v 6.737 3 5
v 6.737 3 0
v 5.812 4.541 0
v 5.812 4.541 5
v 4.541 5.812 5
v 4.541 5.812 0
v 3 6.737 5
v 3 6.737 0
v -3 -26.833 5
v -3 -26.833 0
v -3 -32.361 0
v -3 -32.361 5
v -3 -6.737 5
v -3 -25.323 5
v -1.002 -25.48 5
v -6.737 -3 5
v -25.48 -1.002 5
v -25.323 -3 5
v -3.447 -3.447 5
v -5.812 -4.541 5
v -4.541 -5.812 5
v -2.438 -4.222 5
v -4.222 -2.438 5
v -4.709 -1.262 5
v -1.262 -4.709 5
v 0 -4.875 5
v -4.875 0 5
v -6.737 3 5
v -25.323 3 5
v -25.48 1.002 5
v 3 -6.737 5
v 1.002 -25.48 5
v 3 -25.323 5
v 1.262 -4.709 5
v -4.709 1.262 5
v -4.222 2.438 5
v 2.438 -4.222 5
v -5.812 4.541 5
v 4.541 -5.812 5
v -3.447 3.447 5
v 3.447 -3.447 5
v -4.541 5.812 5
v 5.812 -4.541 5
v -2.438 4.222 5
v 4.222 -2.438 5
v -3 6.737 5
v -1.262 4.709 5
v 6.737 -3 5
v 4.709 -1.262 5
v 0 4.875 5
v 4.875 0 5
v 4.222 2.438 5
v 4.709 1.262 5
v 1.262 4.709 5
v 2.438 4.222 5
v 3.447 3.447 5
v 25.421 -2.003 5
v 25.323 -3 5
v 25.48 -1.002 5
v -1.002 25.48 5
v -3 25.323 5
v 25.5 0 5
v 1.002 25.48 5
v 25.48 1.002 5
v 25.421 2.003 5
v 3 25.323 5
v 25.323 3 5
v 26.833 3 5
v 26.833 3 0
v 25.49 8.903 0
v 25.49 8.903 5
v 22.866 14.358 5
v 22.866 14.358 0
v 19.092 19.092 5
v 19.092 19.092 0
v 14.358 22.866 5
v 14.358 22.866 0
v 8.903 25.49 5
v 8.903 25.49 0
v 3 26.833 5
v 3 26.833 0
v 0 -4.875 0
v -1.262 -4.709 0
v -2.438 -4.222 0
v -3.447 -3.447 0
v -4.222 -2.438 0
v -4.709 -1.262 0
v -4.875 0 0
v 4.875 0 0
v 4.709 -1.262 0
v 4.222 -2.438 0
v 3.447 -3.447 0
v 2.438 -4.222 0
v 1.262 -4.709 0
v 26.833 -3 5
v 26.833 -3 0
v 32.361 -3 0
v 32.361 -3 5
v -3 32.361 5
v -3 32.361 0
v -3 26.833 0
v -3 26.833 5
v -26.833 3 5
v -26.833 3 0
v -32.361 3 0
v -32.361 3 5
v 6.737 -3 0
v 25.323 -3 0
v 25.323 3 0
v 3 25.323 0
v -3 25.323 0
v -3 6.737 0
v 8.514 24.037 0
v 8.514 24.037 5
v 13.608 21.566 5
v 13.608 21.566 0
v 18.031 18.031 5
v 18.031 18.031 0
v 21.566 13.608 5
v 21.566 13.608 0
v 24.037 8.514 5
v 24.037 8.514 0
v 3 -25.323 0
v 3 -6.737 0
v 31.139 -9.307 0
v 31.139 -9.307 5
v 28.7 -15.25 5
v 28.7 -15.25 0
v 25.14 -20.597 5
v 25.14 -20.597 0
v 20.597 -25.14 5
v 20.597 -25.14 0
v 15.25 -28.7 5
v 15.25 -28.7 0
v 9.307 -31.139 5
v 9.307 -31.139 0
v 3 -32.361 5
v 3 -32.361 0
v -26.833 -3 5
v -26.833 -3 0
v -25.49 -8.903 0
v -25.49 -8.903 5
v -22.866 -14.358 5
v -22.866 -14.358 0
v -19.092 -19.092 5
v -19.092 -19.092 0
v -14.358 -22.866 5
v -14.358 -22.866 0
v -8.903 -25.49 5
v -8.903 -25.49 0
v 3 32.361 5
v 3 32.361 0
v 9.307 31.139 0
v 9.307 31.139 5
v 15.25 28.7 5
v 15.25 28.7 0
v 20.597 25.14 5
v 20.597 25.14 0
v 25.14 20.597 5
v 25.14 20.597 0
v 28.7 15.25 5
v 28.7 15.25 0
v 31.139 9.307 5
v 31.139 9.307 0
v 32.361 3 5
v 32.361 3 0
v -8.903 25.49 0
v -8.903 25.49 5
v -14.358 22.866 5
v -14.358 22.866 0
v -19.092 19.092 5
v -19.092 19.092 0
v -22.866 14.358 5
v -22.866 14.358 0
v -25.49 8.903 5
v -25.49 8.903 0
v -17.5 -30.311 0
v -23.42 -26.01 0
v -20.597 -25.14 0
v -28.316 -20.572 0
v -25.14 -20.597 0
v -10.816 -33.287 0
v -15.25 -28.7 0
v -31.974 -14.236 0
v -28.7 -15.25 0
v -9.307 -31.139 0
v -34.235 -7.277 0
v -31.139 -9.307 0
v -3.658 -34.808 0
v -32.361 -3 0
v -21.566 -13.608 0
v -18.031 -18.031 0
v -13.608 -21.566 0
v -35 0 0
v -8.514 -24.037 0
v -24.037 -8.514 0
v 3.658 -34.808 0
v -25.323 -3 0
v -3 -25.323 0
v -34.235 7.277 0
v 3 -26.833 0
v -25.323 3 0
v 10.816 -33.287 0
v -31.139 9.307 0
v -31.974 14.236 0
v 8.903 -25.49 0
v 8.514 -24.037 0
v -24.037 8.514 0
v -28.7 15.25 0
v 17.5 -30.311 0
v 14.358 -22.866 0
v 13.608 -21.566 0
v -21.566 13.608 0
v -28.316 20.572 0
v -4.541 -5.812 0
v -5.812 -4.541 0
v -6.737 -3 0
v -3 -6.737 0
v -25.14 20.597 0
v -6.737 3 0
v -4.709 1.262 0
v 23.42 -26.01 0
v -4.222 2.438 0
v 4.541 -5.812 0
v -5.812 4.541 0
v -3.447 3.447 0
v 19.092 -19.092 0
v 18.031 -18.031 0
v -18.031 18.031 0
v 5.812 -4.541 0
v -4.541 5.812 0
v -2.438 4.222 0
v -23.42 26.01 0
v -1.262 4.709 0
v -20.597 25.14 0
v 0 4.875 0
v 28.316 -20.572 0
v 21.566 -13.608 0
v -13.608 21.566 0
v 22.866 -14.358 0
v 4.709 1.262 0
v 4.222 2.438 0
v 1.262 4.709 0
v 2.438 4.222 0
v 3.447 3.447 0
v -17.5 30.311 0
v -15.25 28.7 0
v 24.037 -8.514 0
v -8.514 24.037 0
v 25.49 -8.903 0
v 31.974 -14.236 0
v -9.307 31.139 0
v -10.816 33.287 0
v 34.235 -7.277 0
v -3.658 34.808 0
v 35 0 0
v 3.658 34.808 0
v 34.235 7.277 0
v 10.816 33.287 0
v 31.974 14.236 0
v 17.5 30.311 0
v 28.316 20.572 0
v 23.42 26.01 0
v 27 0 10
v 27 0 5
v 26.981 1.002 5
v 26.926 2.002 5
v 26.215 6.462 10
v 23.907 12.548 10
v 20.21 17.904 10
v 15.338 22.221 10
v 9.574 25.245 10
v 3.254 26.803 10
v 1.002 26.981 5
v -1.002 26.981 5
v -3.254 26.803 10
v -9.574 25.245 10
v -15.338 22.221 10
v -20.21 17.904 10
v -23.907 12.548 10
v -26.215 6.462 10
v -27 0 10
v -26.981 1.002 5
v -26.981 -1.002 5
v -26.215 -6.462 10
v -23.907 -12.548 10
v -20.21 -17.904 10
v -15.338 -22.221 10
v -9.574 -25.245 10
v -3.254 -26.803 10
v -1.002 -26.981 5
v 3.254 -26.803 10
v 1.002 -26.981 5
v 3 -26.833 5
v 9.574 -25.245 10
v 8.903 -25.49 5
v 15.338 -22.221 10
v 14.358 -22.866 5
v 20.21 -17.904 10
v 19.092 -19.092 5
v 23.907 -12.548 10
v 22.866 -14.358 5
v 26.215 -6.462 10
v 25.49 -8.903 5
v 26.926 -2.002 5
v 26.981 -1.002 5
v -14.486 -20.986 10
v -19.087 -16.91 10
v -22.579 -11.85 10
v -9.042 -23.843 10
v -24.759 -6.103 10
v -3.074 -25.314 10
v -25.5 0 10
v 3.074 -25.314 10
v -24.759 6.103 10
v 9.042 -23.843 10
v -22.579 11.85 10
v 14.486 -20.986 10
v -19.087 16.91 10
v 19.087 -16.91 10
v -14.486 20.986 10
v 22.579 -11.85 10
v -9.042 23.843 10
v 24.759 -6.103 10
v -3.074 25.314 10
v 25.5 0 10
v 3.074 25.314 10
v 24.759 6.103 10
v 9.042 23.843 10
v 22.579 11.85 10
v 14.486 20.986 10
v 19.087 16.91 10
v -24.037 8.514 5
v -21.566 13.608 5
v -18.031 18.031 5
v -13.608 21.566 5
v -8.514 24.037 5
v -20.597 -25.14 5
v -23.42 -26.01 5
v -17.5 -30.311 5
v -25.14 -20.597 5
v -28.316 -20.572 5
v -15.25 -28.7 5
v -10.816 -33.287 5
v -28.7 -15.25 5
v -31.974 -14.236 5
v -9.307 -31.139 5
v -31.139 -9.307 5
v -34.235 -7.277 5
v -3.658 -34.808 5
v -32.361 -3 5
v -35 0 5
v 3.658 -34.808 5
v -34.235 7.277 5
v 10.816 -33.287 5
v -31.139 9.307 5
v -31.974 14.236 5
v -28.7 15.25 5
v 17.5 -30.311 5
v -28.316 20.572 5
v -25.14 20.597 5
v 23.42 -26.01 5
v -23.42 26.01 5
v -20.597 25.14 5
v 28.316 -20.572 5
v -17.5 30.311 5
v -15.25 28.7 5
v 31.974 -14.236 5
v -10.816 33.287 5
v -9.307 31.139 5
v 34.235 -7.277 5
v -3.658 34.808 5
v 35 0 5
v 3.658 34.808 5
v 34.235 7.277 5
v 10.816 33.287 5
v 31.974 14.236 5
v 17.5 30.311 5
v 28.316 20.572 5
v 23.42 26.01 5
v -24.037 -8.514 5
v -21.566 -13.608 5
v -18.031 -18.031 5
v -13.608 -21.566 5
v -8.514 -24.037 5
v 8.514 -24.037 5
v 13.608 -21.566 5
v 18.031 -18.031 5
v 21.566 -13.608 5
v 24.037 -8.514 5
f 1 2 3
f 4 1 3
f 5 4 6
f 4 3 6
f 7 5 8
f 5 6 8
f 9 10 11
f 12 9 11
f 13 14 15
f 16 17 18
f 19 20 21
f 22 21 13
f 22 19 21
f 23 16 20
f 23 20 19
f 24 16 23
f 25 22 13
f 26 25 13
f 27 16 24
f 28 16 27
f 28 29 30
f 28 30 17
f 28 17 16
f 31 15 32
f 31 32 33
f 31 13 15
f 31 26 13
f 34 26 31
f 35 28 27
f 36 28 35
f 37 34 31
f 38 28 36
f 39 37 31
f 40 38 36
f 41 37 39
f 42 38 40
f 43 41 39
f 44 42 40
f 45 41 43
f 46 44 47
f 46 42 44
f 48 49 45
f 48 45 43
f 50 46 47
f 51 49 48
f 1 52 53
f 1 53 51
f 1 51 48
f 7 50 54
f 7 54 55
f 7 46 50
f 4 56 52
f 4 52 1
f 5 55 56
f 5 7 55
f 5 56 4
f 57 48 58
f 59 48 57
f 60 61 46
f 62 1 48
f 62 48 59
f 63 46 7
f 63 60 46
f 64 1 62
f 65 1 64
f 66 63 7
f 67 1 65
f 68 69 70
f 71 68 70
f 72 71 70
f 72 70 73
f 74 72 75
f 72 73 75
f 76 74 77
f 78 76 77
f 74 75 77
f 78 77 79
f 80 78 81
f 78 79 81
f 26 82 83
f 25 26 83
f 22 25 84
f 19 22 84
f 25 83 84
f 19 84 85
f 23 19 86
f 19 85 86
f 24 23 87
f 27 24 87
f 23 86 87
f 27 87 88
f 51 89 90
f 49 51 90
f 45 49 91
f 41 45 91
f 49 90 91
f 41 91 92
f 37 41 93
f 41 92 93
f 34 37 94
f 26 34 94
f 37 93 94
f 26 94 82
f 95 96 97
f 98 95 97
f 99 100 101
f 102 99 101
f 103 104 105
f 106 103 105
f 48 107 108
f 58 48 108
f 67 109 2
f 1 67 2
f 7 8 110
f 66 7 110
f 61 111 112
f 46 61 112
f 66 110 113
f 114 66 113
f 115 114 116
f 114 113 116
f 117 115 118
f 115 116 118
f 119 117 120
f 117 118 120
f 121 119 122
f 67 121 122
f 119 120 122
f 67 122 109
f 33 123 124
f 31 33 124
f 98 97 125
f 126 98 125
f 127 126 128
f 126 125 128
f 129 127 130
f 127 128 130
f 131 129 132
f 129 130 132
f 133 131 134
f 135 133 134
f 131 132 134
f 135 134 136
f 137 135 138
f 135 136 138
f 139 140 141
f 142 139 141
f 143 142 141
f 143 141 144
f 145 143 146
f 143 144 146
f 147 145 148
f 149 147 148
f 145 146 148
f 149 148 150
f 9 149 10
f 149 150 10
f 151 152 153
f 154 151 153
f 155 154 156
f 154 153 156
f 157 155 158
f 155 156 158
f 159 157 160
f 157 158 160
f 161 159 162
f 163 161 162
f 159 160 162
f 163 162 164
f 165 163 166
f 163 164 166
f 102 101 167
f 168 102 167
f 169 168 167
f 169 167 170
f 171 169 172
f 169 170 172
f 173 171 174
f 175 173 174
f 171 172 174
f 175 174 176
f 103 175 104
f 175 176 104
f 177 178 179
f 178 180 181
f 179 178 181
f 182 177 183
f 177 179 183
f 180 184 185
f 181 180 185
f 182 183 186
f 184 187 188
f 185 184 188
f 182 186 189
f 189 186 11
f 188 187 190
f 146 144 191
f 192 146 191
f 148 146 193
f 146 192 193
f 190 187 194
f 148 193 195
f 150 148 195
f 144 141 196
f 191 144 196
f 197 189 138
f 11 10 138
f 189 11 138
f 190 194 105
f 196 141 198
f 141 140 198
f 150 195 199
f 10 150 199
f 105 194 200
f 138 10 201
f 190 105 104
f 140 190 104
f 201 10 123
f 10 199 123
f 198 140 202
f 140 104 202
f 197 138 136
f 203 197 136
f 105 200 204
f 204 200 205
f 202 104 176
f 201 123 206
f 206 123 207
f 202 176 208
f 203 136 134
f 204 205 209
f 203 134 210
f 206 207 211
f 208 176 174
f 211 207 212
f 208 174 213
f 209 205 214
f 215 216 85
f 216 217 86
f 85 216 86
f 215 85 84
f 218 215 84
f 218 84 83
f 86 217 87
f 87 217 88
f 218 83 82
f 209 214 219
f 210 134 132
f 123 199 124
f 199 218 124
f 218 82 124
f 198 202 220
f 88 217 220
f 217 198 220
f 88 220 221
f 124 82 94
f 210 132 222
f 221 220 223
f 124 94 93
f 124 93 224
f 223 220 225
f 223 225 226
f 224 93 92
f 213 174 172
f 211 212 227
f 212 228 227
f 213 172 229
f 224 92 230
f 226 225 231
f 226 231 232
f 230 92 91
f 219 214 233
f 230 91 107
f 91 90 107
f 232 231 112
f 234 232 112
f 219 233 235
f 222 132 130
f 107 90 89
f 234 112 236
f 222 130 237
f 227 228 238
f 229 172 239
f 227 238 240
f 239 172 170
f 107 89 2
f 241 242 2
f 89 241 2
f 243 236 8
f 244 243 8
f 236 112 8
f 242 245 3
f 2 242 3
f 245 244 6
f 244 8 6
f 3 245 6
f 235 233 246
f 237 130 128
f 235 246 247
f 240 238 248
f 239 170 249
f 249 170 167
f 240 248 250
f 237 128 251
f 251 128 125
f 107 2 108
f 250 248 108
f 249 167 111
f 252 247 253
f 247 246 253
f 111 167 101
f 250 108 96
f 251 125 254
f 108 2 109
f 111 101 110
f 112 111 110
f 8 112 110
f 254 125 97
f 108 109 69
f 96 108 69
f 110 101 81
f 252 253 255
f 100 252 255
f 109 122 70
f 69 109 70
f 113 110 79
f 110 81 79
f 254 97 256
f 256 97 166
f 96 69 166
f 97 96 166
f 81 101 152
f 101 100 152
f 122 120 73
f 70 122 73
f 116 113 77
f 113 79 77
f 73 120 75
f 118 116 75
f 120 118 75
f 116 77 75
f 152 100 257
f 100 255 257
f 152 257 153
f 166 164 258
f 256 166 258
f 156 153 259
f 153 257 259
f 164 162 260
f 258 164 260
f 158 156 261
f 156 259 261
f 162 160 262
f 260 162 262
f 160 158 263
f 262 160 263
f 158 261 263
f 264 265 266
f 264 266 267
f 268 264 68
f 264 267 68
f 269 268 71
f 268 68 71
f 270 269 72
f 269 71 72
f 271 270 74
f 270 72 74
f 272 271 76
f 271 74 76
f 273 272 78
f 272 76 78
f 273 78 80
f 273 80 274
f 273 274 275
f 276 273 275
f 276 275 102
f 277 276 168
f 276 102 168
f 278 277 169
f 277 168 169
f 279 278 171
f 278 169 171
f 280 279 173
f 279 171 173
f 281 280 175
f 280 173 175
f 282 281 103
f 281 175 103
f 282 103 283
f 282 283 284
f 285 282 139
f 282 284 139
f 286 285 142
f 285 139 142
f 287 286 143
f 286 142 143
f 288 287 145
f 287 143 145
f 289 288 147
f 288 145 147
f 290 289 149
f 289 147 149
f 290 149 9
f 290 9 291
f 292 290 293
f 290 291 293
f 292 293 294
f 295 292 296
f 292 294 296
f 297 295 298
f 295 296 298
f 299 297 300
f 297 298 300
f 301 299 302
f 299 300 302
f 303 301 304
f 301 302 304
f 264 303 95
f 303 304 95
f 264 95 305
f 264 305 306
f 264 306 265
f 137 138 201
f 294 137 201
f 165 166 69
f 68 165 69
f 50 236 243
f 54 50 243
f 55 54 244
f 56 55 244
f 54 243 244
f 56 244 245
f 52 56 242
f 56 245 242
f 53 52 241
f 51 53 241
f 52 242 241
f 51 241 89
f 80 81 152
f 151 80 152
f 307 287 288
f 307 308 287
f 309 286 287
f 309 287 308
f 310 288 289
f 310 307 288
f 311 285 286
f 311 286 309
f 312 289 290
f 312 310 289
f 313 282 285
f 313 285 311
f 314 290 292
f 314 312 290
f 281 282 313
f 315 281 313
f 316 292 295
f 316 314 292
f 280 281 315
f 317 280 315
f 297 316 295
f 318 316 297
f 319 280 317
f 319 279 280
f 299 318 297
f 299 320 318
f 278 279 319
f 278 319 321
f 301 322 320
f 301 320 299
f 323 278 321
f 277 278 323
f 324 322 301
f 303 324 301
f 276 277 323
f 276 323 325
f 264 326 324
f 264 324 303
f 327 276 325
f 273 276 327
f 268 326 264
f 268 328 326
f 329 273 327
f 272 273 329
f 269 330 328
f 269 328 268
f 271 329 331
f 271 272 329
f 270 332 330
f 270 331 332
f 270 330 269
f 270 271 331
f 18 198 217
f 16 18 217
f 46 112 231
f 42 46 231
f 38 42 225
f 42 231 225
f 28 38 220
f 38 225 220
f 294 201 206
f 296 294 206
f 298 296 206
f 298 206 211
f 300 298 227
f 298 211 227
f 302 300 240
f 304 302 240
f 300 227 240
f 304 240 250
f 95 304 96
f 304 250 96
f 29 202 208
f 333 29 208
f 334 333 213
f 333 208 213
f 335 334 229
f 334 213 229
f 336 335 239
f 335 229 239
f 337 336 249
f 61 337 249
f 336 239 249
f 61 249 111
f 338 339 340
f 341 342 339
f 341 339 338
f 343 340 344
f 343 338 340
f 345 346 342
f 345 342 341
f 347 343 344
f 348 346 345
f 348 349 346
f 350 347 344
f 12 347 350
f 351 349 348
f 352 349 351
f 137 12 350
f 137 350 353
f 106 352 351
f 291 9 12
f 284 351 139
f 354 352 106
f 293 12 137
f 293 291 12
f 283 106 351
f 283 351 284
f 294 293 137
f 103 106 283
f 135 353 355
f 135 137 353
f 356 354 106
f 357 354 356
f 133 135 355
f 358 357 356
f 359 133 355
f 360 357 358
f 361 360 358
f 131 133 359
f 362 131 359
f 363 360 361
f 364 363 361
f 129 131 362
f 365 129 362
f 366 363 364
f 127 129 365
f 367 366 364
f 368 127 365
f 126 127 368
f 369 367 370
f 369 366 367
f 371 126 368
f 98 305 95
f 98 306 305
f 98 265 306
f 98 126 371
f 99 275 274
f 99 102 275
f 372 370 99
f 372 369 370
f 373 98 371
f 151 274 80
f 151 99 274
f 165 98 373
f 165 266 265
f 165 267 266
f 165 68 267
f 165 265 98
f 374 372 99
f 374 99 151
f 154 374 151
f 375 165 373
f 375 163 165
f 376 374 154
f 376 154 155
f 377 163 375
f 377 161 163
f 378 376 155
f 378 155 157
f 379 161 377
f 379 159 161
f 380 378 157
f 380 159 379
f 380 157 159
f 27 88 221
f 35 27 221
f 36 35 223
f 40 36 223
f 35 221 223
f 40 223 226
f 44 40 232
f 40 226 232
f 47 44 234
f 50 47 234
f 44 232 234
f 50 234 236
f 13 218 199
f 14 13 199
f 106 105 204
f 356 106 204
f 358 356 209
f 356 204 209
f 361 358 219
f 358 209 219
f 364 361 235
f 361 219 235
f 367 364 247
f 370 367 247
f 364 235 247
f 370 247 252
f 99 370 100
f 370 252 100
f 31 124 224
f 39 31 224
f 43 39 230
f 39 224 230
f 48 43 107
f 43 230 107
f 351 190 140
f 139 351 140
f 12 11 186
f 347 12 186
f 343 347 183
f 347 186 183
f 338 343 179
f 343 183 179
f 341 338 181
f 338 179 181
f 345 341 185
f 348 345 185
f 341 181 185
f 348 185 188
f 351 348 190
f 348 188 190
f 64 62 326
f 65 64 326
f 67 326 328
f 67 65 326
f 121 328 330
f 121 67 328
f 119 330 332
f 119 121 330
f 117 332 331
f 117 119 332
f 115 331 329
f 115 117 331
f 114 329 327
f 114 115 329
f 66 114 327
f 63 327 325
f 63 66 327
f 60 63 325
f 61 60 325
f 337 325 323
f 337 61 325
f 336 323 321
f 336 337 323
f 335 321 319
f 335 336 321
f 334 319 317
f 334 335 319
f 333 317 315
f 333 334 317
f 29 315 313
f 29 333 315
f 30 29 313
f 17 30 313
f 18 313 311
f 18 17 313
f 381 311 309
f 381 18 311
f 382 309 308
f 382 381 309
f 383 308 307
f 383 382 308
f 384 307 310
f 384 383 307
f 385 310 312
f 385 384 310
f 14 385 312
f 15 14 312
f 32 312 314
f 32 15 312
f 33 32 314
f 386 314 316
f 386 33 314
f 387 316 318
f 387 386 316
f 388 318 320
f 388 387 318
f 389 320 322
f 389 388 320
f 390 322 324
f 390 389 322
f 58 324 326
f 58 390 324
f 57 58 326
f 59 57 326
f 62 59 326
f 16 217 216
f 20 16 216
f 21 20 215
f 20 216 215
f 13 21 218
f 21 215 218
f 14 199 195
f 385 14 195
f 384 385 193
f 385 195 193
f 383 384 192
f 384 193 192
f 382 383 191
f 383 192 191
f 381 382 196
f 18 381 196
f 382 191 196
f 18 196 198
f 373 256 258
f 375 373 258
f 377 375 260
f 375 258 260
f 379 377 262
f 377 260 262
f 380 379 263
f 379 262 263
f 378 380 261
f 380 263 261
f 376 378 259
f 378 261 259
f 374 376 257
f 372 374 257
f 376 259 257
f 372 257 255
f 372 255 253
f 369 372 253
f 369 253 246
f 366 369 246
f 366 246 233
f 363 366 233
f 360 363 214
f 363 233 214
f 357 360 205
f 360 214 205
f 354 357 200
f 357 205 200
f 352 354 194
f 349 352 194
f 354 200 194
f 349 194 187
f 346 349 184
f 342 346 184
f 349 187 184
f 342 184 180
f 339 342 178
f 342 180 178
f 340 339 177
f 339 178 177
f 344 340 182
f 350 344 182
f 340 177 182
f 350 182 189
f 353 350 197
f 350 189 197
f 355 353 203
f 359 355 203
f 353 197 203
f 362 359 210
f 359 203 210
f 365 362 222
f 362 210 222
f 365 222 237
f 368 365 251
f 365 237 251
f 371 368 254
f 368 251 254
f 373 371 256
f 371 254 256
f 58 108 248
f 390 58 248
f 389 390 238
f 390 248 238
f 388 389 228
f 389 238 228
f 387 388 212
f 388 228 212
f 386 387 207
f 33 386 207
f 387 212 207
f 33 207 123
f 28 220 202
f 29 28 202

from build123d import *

# Parameters (mm, degrees)
F0_R     = 35
F1_DEPTH = 5
F2_R     = 27
F2_R_2   = 25.5
F3_DEPTH = 5


with BuildPart() as f1:
    # F0 (on Top) → F1 (new body)
    with BuildSketch(Plane.XY):
        Circle(F0_R)
        with BuildLine():
            ThreePointArc((3, 32.3612422506), (22.9809703886, 22.9809703886), (32.3612422506, 3))
            ThreePointArc((32.3612422506, 3), (32.4652920297, 1.5016036189), (32.5, 0))
            ThreePointArc((32.5, 0), (32.4652920297, -1.5016036189), (32.3612422506, -3))
            ThreePointArc((32.3612422506, -3), (22.9809703886, -22.9809703886), (3, -32.3612422506))
            ThreePointArc((3, -32.3612422506), (0, -32.5), (-3, -32.3612422506))
            ThreePointArc((-3, -32.3612422506), (-22.9809703886, -22.9809703886), (-32.3612422506, -3))
            ThreePointArc((-32.3612422506, -3), (-32.5, 0), (-32.3612422506, 3))
            ThreePointArc((-32.3612422506, 3), (-22.9809703886, 22.9809703886), (-3, 32.3612422506))
            ThreePointArc((-3, 32.3612422506), (0, 32.5), (3, 32.3612422506))
        make_face(mode=Mode.SUBTRACT)
        with BuildLine():
            ThreePointArc((-6.7372564891, -3), (-7.2138024511, -1.5335185674), (-7.375, 0))
            ThreePointArc((-7.375, 0), (-7.2138024511, 1.5335185674), (-6.7372564891, 3))
            Line((-6.7372564891, 3), (-23.8117617996, 3))
            ThreePointArc((-23.8117617996, 3), (-24, 0), (-23.8117617996, -3))
            Line((-23.8117617996, -3), (-6.7372564891, -3))
        make_face()
        with BuildLine():
            ThreePointArc((-4.875, 0), (-3.4471455583, 3.4471455583), (0, 4.875))
            Line((0, 4.875), (0, 7.375))
            ThreePointArc((0, 7.375), (-1.5335185674, 7.2138024511), (-3, 6.7372564891))
            ThreePointArc((-3, 6.7372564891), (-5.2149125113, 5.2149125113), (-6.7372564891, 3))
            ThreePointArc((-6.7372564891, 3), (-7.2138024511, 1.5335185674), (-7.375, 0))
            Line((-7.375, 0), (-4.875, 0))
        make_face()
        with BuildLine():
            Line((0, -7.375), (0, -4.875))
            ThreePointArc((0, -4.875), (-3.4471455583, -3.4471455583), (-4.875, 0))
            Line((-4.875, 0), (-7.375, 0))
            ThreePointArc((-7.375, 0), (-7.2138024511, -1.5335185674), (-6.7372564891, -3))
            ThreePointArc((-6.7372564891, -3), (-5.2149125113, -5.2149125113), (-3, -6.7372564891))
            ThreePointArc((-3, -6.7372564891), (-1.5335185674, -7.2138024511), (0, -7.375))
        make_face()
        with BuildLine():
            Line((7.375, 0), (4.875, 0))
            ThreePointArc((4.875, 0), (3.4471455583, -3.4471455583), (0, -4.875))
            Line((0, -4.875), (0, -7.375))
            ThreePointArc((0, -7.375), (1.5335185674, -7.2138024511), (3, -6.7372564891))
            ThreePointArc((3, -6.7372564891), (5.2149125113, -5.2149125113), (6.7372564891, -3))
            ThreePointArc((6.7372564891, -3), (7.2138024511, -1.5335185674), (7.375, 0))
        make_face()
        with BuildLine():
            ThreePointArc((0, 4.875), (3.4471455583, 3.4471455583), (4.875, 0))
            Line((4.875, 0), (7.375, 0))
            ThreePointArc((7.375, 0), (7.2138024511, 1.5335185674), (6.7372564891, 3))
            ThreePointArc((6.7372564891, 3), (5.2149125113, 5.2149125113), (3, 6.7372564891))
            ThreePointArc((3, 6.7372564891), (1.5335185674, 7.2138024511), (0, 7.375))
            Line((0, 7.375), (0, 4.875))
        make_face()
        with BuildLine():
            ThreePointArc((-3, 6.7372564891), (-1.5335185674, 7.2138024511), (0, 7.375))
            ThreePointArc((0, 7.375), (1.5335185674, 7.2138024511), (3, 6.7372564891))
            Line((3, 6.7372564891), (3, 23.8117617996))
            ThreePointArc((3, 23.8117617996), (0, 24), (-3, 23.8117617996))
            Line((-3, 23.8117617996), (-3, 6.7372564891))
        make_face()
        with BuildLine():
            ThreePointArc((6.7372564891, 3), (7.2138024511, 1.5335185674), (7.375, 0))
            ThreePointArc((7.375, 0), (7.2138024511, -1.5335185674), (6.7372564891, -3))
            Line((6.7372564891, -3), (23.8117617996, -3))
            ThreePointArc((23.8117617996, -3), (23.9528942217, -1.502949901), (24, 0))
            ThreePointArc((24, 0), (23.9528942217, 1.502949901), (23.8117617996, 3))
            Line((23.8117617996, 3), (6.7372564891, 3))
        make_face()
        with BuildLine():
            ThreePointArc((3, -6.7372564891), (1.5335185674, -7.2138024511), (0, -7.375))
            ThreePointArc((0, -7.375), (-1.5335185674, -7.2138024511), (-3, -6.7372564891))
            Line((-3, -6.7372564891), (-3, -23.8117617996))
            ThreePointArc((-3, -23.8117617996), (0, -24), (3, -23.8117617996))
            Line((3, -23.8117617996), (3, -6.7372564891))
        make_face()
        with BuildLine():
            ThreePointArc((-3, 23.8117617996), (0, 24), (3, 23.8117617996))
            Line((3, 23.8117617996), (3, 25.3229145242))
            ThreePointArc((3, 25.3229145242), (0, 25.5), (-3, 25.3229145242))
            Line((-3, 25.3229145242), (-3, 23.8117617996))
        make_face()
        with BuildLine():
            ThreePointArc((-3, 25.3229145242), (0, 25.5), (3, 25.3229145242))
            Line((3, 25.3229145242), (3, 26.83281573))
            ThreePointArc((3, 26.83281573), (0, 27), (-3, 26.83281573))
            Line((-3, 26.83281573), (-3, 25.3229145242))
        make_face()
        with BuildLine():
            ThreePointArc((-3, 26.83281573), (0, 27), (3, 26.83281573))
            Line((3, 26.83281573), (3, 32.3612422506))
            ThreePointArc((3, 32.3612422506), (0, 32.5), (-3, 32.3612422506))
            Line((-3, 32.3612422506), (-3, 26.83281573))
        make_face()
        with BuildLine():
            Line((25.3229145242, 3), (23.8117617996, 3))
            ThreePointArc((23.8117617996, 3), (23.9528942217, 1.502949901), (24, 0))
            ThreePointArc((24, 0), (23.9528942217, -1.502949901), (23.8117617996, -3))
            Line((23.8117617996, -3), (25.3229145242, -3))
            ThreePointArc((25.3229145242, -3), (25.4556901337, -1.5026109997), (25.5, 0))
            ThreePointArc((25.5, 0), (25.4556901337, 1.5026109997), (25.3229145242, 3))
        make_face()
        with BuildLine():
            Line((26.83281573, 3), (25.3229145242, 3))
            ThreePointArc((25.3229145242, 3), (25.4556901337, 1.5026109997), (25.5, 0))
            ThreePointArc((25.5, 0), (25.4556901337, -1.5026109997), (25.3229145242, -3))
            Line((25.3229145242, -3), (26.83281573, -3))
            ThreePointArc((26.83281573, -3), (26.9581715321, -1.5023274094), (27, 0))
            ThreePointArc((27, 0), (26.9581715321, 1.5023274094), (26.83281573, 3))
        make_face()
        with BuildLine():
            Line((32.3612422506, 3), (26.83281573, 3))
            ThreePointArc((26.83281573, 3), (26.9581715321, 1.5023274094), (27, 0))
            ThreePointArc((27, 0), (26.9581715321, -1.5023274094), (26.83281573, -3))
            Line((26.83281573, -3), (32.3612422506, -3))
            ThreePointArc((32.3612422506, -3), (32.4652920297, -1.5016036189), (32.5, 0))
            ThreePointArc((32.5, 0), (32.4652920297, 1.5016036189), (32.3612422506, 3))
        make_face()
        with BuildLine():
            ThreePointArc((-23.8117617996, -3), (-24, 0), (-23.8117617996, 3))
            Line((-23.8117617996, 3), (-25.3229145242, 3))
            ThreePointArc((-25.3229145242, 3), (-25.5, 0), (-25.3229145242, -3))
            Line((-25.3229145242, -3), (-23.8117617996, -3))
        make_face()
        with BuildLine():
            ThreePointArc((-25.3229145242, -3), (-25.5, 0), (-25.3229145242, 3))
            Line((-25.3229145242, 3), (-26.83281573, 3))
            ThreePointArc((-26.83281573, 3), (-27, 0), (-26.83281573, -3))
            Line((-26.83281573, -3), (-25.3229145242, -3))
        make_face()
        with BuildLine():
            ThreePointArc((-26.83281573, -3), (-27, 0), (-26.83281573, 3))
            Line((-26.83281573, 3), (-32.3612422506, 3))
            ThreePointArc((-32.3612422506, 3), (-32.5, 0), (-32.3612422506, -3))
            Line((-32.3612422506, -3), (-26.83281573, -3))
        make_face()
        with BuildLine():
            ThreePointArc((3, -23.8117617996), (0, -24), (-3, -23.8117617996))
            Line((-3, -23.8117617996), (-3, -25.3229145242))
            ThreePointArc((-3, -25.3229145242), (0, -25.5), (3, -25.3229145242))
            Line((3, -25.3229145242), (3, -23.8117617996))
        make_face()
        with BuildLine():
            ThreePointArc((3, -25.3229145242), (0, -25.5), (-3, -25.3229145242))
            Line((-3, -25.3229145242), (-3, -26.83281573))
            ThreePointArc((-3, -26.83281573), (0, -27), (3, -26.83281573))
            Line((3, -26.83281573), (3, -25.3229145242))
        make_face()
        with BuildLine():
            ThreePointArc((3, -26.83281573), (0, -27), (-3, -26.83281573))
            Line((-3, -26.83281573), (-3, -32.3612422506))
            ThreePointArc((-3, -32.3612422506), (0, -32.5), (3, -32.3612422506))
            Line((3, -32.3612422506), (3, -26.83281573))
        make_face()
        with BuildLine():
            ThreePointArc((-25.3229145242, 3), (-18.0312229203, 18.0312229203), (-3, 25.3229145242))
            Line((-3, 25.3229145242), (-3, 26.83281573))
            ThreePointArc((-3, 26.83281573), (-19.091883092, 19.091883092), (-26.83281573, 3))
            Line((-26.83281573, 3), (-25.3229145242, 3))
        make_face()
        with BuildLine():
            ThreePointArc((3, 25.3229145242), (18.0312229203, 18.0312229203), (25.3229145242, 3))
            Line((25.3229145242, 3), (26.83281573, 3))
            ThreePointArc((26.83281573, 3), (19.091883092, 19.091883092), (3, 26.83281573))
            Line((3, 26.83281573), (3, 25.3229145242))
        make_face()
        with BuildLine():
            Line((26.83281573, -3), (25.3229145242, -3))
            ThreePointArc((25.3229145242, -3), (18.0312229203, -18.0312229203), (3, -25.3229145242))
            Line((3, -25.3229145242), (3, -26.83281573))
            ThreePointArc((3, -26.83281573), (19.091883092, -19.091883092), (26.83281573, -3))
        make_face()
        with BuildLine():
            Line((-3, -26.83281573), (-3, -25.3229145242))
            ThreePointArc((-3, -25.3229145242), (-18.0312229203, -18.0312229203), (-25.3229145242, -3))
            Line((-25.3229145242, -3), (-26.83281573, -3))
            ThreePointArc((-26.83281573, -3), (-19.091883092, -19.091883092), (-3, -26.83281573))
        make_face()
    extrude(amount=F1_DEPTH)

    # F2 (on face) → F3 (join)
    with BuildSketch(Plane.XY.offset(5)):
        Circle(F2_R)
        Circle(F2_R_2, mode=Mode.SUBTRACT)
    extrude(amount=F3_DEPTH)


solid = f1.part
